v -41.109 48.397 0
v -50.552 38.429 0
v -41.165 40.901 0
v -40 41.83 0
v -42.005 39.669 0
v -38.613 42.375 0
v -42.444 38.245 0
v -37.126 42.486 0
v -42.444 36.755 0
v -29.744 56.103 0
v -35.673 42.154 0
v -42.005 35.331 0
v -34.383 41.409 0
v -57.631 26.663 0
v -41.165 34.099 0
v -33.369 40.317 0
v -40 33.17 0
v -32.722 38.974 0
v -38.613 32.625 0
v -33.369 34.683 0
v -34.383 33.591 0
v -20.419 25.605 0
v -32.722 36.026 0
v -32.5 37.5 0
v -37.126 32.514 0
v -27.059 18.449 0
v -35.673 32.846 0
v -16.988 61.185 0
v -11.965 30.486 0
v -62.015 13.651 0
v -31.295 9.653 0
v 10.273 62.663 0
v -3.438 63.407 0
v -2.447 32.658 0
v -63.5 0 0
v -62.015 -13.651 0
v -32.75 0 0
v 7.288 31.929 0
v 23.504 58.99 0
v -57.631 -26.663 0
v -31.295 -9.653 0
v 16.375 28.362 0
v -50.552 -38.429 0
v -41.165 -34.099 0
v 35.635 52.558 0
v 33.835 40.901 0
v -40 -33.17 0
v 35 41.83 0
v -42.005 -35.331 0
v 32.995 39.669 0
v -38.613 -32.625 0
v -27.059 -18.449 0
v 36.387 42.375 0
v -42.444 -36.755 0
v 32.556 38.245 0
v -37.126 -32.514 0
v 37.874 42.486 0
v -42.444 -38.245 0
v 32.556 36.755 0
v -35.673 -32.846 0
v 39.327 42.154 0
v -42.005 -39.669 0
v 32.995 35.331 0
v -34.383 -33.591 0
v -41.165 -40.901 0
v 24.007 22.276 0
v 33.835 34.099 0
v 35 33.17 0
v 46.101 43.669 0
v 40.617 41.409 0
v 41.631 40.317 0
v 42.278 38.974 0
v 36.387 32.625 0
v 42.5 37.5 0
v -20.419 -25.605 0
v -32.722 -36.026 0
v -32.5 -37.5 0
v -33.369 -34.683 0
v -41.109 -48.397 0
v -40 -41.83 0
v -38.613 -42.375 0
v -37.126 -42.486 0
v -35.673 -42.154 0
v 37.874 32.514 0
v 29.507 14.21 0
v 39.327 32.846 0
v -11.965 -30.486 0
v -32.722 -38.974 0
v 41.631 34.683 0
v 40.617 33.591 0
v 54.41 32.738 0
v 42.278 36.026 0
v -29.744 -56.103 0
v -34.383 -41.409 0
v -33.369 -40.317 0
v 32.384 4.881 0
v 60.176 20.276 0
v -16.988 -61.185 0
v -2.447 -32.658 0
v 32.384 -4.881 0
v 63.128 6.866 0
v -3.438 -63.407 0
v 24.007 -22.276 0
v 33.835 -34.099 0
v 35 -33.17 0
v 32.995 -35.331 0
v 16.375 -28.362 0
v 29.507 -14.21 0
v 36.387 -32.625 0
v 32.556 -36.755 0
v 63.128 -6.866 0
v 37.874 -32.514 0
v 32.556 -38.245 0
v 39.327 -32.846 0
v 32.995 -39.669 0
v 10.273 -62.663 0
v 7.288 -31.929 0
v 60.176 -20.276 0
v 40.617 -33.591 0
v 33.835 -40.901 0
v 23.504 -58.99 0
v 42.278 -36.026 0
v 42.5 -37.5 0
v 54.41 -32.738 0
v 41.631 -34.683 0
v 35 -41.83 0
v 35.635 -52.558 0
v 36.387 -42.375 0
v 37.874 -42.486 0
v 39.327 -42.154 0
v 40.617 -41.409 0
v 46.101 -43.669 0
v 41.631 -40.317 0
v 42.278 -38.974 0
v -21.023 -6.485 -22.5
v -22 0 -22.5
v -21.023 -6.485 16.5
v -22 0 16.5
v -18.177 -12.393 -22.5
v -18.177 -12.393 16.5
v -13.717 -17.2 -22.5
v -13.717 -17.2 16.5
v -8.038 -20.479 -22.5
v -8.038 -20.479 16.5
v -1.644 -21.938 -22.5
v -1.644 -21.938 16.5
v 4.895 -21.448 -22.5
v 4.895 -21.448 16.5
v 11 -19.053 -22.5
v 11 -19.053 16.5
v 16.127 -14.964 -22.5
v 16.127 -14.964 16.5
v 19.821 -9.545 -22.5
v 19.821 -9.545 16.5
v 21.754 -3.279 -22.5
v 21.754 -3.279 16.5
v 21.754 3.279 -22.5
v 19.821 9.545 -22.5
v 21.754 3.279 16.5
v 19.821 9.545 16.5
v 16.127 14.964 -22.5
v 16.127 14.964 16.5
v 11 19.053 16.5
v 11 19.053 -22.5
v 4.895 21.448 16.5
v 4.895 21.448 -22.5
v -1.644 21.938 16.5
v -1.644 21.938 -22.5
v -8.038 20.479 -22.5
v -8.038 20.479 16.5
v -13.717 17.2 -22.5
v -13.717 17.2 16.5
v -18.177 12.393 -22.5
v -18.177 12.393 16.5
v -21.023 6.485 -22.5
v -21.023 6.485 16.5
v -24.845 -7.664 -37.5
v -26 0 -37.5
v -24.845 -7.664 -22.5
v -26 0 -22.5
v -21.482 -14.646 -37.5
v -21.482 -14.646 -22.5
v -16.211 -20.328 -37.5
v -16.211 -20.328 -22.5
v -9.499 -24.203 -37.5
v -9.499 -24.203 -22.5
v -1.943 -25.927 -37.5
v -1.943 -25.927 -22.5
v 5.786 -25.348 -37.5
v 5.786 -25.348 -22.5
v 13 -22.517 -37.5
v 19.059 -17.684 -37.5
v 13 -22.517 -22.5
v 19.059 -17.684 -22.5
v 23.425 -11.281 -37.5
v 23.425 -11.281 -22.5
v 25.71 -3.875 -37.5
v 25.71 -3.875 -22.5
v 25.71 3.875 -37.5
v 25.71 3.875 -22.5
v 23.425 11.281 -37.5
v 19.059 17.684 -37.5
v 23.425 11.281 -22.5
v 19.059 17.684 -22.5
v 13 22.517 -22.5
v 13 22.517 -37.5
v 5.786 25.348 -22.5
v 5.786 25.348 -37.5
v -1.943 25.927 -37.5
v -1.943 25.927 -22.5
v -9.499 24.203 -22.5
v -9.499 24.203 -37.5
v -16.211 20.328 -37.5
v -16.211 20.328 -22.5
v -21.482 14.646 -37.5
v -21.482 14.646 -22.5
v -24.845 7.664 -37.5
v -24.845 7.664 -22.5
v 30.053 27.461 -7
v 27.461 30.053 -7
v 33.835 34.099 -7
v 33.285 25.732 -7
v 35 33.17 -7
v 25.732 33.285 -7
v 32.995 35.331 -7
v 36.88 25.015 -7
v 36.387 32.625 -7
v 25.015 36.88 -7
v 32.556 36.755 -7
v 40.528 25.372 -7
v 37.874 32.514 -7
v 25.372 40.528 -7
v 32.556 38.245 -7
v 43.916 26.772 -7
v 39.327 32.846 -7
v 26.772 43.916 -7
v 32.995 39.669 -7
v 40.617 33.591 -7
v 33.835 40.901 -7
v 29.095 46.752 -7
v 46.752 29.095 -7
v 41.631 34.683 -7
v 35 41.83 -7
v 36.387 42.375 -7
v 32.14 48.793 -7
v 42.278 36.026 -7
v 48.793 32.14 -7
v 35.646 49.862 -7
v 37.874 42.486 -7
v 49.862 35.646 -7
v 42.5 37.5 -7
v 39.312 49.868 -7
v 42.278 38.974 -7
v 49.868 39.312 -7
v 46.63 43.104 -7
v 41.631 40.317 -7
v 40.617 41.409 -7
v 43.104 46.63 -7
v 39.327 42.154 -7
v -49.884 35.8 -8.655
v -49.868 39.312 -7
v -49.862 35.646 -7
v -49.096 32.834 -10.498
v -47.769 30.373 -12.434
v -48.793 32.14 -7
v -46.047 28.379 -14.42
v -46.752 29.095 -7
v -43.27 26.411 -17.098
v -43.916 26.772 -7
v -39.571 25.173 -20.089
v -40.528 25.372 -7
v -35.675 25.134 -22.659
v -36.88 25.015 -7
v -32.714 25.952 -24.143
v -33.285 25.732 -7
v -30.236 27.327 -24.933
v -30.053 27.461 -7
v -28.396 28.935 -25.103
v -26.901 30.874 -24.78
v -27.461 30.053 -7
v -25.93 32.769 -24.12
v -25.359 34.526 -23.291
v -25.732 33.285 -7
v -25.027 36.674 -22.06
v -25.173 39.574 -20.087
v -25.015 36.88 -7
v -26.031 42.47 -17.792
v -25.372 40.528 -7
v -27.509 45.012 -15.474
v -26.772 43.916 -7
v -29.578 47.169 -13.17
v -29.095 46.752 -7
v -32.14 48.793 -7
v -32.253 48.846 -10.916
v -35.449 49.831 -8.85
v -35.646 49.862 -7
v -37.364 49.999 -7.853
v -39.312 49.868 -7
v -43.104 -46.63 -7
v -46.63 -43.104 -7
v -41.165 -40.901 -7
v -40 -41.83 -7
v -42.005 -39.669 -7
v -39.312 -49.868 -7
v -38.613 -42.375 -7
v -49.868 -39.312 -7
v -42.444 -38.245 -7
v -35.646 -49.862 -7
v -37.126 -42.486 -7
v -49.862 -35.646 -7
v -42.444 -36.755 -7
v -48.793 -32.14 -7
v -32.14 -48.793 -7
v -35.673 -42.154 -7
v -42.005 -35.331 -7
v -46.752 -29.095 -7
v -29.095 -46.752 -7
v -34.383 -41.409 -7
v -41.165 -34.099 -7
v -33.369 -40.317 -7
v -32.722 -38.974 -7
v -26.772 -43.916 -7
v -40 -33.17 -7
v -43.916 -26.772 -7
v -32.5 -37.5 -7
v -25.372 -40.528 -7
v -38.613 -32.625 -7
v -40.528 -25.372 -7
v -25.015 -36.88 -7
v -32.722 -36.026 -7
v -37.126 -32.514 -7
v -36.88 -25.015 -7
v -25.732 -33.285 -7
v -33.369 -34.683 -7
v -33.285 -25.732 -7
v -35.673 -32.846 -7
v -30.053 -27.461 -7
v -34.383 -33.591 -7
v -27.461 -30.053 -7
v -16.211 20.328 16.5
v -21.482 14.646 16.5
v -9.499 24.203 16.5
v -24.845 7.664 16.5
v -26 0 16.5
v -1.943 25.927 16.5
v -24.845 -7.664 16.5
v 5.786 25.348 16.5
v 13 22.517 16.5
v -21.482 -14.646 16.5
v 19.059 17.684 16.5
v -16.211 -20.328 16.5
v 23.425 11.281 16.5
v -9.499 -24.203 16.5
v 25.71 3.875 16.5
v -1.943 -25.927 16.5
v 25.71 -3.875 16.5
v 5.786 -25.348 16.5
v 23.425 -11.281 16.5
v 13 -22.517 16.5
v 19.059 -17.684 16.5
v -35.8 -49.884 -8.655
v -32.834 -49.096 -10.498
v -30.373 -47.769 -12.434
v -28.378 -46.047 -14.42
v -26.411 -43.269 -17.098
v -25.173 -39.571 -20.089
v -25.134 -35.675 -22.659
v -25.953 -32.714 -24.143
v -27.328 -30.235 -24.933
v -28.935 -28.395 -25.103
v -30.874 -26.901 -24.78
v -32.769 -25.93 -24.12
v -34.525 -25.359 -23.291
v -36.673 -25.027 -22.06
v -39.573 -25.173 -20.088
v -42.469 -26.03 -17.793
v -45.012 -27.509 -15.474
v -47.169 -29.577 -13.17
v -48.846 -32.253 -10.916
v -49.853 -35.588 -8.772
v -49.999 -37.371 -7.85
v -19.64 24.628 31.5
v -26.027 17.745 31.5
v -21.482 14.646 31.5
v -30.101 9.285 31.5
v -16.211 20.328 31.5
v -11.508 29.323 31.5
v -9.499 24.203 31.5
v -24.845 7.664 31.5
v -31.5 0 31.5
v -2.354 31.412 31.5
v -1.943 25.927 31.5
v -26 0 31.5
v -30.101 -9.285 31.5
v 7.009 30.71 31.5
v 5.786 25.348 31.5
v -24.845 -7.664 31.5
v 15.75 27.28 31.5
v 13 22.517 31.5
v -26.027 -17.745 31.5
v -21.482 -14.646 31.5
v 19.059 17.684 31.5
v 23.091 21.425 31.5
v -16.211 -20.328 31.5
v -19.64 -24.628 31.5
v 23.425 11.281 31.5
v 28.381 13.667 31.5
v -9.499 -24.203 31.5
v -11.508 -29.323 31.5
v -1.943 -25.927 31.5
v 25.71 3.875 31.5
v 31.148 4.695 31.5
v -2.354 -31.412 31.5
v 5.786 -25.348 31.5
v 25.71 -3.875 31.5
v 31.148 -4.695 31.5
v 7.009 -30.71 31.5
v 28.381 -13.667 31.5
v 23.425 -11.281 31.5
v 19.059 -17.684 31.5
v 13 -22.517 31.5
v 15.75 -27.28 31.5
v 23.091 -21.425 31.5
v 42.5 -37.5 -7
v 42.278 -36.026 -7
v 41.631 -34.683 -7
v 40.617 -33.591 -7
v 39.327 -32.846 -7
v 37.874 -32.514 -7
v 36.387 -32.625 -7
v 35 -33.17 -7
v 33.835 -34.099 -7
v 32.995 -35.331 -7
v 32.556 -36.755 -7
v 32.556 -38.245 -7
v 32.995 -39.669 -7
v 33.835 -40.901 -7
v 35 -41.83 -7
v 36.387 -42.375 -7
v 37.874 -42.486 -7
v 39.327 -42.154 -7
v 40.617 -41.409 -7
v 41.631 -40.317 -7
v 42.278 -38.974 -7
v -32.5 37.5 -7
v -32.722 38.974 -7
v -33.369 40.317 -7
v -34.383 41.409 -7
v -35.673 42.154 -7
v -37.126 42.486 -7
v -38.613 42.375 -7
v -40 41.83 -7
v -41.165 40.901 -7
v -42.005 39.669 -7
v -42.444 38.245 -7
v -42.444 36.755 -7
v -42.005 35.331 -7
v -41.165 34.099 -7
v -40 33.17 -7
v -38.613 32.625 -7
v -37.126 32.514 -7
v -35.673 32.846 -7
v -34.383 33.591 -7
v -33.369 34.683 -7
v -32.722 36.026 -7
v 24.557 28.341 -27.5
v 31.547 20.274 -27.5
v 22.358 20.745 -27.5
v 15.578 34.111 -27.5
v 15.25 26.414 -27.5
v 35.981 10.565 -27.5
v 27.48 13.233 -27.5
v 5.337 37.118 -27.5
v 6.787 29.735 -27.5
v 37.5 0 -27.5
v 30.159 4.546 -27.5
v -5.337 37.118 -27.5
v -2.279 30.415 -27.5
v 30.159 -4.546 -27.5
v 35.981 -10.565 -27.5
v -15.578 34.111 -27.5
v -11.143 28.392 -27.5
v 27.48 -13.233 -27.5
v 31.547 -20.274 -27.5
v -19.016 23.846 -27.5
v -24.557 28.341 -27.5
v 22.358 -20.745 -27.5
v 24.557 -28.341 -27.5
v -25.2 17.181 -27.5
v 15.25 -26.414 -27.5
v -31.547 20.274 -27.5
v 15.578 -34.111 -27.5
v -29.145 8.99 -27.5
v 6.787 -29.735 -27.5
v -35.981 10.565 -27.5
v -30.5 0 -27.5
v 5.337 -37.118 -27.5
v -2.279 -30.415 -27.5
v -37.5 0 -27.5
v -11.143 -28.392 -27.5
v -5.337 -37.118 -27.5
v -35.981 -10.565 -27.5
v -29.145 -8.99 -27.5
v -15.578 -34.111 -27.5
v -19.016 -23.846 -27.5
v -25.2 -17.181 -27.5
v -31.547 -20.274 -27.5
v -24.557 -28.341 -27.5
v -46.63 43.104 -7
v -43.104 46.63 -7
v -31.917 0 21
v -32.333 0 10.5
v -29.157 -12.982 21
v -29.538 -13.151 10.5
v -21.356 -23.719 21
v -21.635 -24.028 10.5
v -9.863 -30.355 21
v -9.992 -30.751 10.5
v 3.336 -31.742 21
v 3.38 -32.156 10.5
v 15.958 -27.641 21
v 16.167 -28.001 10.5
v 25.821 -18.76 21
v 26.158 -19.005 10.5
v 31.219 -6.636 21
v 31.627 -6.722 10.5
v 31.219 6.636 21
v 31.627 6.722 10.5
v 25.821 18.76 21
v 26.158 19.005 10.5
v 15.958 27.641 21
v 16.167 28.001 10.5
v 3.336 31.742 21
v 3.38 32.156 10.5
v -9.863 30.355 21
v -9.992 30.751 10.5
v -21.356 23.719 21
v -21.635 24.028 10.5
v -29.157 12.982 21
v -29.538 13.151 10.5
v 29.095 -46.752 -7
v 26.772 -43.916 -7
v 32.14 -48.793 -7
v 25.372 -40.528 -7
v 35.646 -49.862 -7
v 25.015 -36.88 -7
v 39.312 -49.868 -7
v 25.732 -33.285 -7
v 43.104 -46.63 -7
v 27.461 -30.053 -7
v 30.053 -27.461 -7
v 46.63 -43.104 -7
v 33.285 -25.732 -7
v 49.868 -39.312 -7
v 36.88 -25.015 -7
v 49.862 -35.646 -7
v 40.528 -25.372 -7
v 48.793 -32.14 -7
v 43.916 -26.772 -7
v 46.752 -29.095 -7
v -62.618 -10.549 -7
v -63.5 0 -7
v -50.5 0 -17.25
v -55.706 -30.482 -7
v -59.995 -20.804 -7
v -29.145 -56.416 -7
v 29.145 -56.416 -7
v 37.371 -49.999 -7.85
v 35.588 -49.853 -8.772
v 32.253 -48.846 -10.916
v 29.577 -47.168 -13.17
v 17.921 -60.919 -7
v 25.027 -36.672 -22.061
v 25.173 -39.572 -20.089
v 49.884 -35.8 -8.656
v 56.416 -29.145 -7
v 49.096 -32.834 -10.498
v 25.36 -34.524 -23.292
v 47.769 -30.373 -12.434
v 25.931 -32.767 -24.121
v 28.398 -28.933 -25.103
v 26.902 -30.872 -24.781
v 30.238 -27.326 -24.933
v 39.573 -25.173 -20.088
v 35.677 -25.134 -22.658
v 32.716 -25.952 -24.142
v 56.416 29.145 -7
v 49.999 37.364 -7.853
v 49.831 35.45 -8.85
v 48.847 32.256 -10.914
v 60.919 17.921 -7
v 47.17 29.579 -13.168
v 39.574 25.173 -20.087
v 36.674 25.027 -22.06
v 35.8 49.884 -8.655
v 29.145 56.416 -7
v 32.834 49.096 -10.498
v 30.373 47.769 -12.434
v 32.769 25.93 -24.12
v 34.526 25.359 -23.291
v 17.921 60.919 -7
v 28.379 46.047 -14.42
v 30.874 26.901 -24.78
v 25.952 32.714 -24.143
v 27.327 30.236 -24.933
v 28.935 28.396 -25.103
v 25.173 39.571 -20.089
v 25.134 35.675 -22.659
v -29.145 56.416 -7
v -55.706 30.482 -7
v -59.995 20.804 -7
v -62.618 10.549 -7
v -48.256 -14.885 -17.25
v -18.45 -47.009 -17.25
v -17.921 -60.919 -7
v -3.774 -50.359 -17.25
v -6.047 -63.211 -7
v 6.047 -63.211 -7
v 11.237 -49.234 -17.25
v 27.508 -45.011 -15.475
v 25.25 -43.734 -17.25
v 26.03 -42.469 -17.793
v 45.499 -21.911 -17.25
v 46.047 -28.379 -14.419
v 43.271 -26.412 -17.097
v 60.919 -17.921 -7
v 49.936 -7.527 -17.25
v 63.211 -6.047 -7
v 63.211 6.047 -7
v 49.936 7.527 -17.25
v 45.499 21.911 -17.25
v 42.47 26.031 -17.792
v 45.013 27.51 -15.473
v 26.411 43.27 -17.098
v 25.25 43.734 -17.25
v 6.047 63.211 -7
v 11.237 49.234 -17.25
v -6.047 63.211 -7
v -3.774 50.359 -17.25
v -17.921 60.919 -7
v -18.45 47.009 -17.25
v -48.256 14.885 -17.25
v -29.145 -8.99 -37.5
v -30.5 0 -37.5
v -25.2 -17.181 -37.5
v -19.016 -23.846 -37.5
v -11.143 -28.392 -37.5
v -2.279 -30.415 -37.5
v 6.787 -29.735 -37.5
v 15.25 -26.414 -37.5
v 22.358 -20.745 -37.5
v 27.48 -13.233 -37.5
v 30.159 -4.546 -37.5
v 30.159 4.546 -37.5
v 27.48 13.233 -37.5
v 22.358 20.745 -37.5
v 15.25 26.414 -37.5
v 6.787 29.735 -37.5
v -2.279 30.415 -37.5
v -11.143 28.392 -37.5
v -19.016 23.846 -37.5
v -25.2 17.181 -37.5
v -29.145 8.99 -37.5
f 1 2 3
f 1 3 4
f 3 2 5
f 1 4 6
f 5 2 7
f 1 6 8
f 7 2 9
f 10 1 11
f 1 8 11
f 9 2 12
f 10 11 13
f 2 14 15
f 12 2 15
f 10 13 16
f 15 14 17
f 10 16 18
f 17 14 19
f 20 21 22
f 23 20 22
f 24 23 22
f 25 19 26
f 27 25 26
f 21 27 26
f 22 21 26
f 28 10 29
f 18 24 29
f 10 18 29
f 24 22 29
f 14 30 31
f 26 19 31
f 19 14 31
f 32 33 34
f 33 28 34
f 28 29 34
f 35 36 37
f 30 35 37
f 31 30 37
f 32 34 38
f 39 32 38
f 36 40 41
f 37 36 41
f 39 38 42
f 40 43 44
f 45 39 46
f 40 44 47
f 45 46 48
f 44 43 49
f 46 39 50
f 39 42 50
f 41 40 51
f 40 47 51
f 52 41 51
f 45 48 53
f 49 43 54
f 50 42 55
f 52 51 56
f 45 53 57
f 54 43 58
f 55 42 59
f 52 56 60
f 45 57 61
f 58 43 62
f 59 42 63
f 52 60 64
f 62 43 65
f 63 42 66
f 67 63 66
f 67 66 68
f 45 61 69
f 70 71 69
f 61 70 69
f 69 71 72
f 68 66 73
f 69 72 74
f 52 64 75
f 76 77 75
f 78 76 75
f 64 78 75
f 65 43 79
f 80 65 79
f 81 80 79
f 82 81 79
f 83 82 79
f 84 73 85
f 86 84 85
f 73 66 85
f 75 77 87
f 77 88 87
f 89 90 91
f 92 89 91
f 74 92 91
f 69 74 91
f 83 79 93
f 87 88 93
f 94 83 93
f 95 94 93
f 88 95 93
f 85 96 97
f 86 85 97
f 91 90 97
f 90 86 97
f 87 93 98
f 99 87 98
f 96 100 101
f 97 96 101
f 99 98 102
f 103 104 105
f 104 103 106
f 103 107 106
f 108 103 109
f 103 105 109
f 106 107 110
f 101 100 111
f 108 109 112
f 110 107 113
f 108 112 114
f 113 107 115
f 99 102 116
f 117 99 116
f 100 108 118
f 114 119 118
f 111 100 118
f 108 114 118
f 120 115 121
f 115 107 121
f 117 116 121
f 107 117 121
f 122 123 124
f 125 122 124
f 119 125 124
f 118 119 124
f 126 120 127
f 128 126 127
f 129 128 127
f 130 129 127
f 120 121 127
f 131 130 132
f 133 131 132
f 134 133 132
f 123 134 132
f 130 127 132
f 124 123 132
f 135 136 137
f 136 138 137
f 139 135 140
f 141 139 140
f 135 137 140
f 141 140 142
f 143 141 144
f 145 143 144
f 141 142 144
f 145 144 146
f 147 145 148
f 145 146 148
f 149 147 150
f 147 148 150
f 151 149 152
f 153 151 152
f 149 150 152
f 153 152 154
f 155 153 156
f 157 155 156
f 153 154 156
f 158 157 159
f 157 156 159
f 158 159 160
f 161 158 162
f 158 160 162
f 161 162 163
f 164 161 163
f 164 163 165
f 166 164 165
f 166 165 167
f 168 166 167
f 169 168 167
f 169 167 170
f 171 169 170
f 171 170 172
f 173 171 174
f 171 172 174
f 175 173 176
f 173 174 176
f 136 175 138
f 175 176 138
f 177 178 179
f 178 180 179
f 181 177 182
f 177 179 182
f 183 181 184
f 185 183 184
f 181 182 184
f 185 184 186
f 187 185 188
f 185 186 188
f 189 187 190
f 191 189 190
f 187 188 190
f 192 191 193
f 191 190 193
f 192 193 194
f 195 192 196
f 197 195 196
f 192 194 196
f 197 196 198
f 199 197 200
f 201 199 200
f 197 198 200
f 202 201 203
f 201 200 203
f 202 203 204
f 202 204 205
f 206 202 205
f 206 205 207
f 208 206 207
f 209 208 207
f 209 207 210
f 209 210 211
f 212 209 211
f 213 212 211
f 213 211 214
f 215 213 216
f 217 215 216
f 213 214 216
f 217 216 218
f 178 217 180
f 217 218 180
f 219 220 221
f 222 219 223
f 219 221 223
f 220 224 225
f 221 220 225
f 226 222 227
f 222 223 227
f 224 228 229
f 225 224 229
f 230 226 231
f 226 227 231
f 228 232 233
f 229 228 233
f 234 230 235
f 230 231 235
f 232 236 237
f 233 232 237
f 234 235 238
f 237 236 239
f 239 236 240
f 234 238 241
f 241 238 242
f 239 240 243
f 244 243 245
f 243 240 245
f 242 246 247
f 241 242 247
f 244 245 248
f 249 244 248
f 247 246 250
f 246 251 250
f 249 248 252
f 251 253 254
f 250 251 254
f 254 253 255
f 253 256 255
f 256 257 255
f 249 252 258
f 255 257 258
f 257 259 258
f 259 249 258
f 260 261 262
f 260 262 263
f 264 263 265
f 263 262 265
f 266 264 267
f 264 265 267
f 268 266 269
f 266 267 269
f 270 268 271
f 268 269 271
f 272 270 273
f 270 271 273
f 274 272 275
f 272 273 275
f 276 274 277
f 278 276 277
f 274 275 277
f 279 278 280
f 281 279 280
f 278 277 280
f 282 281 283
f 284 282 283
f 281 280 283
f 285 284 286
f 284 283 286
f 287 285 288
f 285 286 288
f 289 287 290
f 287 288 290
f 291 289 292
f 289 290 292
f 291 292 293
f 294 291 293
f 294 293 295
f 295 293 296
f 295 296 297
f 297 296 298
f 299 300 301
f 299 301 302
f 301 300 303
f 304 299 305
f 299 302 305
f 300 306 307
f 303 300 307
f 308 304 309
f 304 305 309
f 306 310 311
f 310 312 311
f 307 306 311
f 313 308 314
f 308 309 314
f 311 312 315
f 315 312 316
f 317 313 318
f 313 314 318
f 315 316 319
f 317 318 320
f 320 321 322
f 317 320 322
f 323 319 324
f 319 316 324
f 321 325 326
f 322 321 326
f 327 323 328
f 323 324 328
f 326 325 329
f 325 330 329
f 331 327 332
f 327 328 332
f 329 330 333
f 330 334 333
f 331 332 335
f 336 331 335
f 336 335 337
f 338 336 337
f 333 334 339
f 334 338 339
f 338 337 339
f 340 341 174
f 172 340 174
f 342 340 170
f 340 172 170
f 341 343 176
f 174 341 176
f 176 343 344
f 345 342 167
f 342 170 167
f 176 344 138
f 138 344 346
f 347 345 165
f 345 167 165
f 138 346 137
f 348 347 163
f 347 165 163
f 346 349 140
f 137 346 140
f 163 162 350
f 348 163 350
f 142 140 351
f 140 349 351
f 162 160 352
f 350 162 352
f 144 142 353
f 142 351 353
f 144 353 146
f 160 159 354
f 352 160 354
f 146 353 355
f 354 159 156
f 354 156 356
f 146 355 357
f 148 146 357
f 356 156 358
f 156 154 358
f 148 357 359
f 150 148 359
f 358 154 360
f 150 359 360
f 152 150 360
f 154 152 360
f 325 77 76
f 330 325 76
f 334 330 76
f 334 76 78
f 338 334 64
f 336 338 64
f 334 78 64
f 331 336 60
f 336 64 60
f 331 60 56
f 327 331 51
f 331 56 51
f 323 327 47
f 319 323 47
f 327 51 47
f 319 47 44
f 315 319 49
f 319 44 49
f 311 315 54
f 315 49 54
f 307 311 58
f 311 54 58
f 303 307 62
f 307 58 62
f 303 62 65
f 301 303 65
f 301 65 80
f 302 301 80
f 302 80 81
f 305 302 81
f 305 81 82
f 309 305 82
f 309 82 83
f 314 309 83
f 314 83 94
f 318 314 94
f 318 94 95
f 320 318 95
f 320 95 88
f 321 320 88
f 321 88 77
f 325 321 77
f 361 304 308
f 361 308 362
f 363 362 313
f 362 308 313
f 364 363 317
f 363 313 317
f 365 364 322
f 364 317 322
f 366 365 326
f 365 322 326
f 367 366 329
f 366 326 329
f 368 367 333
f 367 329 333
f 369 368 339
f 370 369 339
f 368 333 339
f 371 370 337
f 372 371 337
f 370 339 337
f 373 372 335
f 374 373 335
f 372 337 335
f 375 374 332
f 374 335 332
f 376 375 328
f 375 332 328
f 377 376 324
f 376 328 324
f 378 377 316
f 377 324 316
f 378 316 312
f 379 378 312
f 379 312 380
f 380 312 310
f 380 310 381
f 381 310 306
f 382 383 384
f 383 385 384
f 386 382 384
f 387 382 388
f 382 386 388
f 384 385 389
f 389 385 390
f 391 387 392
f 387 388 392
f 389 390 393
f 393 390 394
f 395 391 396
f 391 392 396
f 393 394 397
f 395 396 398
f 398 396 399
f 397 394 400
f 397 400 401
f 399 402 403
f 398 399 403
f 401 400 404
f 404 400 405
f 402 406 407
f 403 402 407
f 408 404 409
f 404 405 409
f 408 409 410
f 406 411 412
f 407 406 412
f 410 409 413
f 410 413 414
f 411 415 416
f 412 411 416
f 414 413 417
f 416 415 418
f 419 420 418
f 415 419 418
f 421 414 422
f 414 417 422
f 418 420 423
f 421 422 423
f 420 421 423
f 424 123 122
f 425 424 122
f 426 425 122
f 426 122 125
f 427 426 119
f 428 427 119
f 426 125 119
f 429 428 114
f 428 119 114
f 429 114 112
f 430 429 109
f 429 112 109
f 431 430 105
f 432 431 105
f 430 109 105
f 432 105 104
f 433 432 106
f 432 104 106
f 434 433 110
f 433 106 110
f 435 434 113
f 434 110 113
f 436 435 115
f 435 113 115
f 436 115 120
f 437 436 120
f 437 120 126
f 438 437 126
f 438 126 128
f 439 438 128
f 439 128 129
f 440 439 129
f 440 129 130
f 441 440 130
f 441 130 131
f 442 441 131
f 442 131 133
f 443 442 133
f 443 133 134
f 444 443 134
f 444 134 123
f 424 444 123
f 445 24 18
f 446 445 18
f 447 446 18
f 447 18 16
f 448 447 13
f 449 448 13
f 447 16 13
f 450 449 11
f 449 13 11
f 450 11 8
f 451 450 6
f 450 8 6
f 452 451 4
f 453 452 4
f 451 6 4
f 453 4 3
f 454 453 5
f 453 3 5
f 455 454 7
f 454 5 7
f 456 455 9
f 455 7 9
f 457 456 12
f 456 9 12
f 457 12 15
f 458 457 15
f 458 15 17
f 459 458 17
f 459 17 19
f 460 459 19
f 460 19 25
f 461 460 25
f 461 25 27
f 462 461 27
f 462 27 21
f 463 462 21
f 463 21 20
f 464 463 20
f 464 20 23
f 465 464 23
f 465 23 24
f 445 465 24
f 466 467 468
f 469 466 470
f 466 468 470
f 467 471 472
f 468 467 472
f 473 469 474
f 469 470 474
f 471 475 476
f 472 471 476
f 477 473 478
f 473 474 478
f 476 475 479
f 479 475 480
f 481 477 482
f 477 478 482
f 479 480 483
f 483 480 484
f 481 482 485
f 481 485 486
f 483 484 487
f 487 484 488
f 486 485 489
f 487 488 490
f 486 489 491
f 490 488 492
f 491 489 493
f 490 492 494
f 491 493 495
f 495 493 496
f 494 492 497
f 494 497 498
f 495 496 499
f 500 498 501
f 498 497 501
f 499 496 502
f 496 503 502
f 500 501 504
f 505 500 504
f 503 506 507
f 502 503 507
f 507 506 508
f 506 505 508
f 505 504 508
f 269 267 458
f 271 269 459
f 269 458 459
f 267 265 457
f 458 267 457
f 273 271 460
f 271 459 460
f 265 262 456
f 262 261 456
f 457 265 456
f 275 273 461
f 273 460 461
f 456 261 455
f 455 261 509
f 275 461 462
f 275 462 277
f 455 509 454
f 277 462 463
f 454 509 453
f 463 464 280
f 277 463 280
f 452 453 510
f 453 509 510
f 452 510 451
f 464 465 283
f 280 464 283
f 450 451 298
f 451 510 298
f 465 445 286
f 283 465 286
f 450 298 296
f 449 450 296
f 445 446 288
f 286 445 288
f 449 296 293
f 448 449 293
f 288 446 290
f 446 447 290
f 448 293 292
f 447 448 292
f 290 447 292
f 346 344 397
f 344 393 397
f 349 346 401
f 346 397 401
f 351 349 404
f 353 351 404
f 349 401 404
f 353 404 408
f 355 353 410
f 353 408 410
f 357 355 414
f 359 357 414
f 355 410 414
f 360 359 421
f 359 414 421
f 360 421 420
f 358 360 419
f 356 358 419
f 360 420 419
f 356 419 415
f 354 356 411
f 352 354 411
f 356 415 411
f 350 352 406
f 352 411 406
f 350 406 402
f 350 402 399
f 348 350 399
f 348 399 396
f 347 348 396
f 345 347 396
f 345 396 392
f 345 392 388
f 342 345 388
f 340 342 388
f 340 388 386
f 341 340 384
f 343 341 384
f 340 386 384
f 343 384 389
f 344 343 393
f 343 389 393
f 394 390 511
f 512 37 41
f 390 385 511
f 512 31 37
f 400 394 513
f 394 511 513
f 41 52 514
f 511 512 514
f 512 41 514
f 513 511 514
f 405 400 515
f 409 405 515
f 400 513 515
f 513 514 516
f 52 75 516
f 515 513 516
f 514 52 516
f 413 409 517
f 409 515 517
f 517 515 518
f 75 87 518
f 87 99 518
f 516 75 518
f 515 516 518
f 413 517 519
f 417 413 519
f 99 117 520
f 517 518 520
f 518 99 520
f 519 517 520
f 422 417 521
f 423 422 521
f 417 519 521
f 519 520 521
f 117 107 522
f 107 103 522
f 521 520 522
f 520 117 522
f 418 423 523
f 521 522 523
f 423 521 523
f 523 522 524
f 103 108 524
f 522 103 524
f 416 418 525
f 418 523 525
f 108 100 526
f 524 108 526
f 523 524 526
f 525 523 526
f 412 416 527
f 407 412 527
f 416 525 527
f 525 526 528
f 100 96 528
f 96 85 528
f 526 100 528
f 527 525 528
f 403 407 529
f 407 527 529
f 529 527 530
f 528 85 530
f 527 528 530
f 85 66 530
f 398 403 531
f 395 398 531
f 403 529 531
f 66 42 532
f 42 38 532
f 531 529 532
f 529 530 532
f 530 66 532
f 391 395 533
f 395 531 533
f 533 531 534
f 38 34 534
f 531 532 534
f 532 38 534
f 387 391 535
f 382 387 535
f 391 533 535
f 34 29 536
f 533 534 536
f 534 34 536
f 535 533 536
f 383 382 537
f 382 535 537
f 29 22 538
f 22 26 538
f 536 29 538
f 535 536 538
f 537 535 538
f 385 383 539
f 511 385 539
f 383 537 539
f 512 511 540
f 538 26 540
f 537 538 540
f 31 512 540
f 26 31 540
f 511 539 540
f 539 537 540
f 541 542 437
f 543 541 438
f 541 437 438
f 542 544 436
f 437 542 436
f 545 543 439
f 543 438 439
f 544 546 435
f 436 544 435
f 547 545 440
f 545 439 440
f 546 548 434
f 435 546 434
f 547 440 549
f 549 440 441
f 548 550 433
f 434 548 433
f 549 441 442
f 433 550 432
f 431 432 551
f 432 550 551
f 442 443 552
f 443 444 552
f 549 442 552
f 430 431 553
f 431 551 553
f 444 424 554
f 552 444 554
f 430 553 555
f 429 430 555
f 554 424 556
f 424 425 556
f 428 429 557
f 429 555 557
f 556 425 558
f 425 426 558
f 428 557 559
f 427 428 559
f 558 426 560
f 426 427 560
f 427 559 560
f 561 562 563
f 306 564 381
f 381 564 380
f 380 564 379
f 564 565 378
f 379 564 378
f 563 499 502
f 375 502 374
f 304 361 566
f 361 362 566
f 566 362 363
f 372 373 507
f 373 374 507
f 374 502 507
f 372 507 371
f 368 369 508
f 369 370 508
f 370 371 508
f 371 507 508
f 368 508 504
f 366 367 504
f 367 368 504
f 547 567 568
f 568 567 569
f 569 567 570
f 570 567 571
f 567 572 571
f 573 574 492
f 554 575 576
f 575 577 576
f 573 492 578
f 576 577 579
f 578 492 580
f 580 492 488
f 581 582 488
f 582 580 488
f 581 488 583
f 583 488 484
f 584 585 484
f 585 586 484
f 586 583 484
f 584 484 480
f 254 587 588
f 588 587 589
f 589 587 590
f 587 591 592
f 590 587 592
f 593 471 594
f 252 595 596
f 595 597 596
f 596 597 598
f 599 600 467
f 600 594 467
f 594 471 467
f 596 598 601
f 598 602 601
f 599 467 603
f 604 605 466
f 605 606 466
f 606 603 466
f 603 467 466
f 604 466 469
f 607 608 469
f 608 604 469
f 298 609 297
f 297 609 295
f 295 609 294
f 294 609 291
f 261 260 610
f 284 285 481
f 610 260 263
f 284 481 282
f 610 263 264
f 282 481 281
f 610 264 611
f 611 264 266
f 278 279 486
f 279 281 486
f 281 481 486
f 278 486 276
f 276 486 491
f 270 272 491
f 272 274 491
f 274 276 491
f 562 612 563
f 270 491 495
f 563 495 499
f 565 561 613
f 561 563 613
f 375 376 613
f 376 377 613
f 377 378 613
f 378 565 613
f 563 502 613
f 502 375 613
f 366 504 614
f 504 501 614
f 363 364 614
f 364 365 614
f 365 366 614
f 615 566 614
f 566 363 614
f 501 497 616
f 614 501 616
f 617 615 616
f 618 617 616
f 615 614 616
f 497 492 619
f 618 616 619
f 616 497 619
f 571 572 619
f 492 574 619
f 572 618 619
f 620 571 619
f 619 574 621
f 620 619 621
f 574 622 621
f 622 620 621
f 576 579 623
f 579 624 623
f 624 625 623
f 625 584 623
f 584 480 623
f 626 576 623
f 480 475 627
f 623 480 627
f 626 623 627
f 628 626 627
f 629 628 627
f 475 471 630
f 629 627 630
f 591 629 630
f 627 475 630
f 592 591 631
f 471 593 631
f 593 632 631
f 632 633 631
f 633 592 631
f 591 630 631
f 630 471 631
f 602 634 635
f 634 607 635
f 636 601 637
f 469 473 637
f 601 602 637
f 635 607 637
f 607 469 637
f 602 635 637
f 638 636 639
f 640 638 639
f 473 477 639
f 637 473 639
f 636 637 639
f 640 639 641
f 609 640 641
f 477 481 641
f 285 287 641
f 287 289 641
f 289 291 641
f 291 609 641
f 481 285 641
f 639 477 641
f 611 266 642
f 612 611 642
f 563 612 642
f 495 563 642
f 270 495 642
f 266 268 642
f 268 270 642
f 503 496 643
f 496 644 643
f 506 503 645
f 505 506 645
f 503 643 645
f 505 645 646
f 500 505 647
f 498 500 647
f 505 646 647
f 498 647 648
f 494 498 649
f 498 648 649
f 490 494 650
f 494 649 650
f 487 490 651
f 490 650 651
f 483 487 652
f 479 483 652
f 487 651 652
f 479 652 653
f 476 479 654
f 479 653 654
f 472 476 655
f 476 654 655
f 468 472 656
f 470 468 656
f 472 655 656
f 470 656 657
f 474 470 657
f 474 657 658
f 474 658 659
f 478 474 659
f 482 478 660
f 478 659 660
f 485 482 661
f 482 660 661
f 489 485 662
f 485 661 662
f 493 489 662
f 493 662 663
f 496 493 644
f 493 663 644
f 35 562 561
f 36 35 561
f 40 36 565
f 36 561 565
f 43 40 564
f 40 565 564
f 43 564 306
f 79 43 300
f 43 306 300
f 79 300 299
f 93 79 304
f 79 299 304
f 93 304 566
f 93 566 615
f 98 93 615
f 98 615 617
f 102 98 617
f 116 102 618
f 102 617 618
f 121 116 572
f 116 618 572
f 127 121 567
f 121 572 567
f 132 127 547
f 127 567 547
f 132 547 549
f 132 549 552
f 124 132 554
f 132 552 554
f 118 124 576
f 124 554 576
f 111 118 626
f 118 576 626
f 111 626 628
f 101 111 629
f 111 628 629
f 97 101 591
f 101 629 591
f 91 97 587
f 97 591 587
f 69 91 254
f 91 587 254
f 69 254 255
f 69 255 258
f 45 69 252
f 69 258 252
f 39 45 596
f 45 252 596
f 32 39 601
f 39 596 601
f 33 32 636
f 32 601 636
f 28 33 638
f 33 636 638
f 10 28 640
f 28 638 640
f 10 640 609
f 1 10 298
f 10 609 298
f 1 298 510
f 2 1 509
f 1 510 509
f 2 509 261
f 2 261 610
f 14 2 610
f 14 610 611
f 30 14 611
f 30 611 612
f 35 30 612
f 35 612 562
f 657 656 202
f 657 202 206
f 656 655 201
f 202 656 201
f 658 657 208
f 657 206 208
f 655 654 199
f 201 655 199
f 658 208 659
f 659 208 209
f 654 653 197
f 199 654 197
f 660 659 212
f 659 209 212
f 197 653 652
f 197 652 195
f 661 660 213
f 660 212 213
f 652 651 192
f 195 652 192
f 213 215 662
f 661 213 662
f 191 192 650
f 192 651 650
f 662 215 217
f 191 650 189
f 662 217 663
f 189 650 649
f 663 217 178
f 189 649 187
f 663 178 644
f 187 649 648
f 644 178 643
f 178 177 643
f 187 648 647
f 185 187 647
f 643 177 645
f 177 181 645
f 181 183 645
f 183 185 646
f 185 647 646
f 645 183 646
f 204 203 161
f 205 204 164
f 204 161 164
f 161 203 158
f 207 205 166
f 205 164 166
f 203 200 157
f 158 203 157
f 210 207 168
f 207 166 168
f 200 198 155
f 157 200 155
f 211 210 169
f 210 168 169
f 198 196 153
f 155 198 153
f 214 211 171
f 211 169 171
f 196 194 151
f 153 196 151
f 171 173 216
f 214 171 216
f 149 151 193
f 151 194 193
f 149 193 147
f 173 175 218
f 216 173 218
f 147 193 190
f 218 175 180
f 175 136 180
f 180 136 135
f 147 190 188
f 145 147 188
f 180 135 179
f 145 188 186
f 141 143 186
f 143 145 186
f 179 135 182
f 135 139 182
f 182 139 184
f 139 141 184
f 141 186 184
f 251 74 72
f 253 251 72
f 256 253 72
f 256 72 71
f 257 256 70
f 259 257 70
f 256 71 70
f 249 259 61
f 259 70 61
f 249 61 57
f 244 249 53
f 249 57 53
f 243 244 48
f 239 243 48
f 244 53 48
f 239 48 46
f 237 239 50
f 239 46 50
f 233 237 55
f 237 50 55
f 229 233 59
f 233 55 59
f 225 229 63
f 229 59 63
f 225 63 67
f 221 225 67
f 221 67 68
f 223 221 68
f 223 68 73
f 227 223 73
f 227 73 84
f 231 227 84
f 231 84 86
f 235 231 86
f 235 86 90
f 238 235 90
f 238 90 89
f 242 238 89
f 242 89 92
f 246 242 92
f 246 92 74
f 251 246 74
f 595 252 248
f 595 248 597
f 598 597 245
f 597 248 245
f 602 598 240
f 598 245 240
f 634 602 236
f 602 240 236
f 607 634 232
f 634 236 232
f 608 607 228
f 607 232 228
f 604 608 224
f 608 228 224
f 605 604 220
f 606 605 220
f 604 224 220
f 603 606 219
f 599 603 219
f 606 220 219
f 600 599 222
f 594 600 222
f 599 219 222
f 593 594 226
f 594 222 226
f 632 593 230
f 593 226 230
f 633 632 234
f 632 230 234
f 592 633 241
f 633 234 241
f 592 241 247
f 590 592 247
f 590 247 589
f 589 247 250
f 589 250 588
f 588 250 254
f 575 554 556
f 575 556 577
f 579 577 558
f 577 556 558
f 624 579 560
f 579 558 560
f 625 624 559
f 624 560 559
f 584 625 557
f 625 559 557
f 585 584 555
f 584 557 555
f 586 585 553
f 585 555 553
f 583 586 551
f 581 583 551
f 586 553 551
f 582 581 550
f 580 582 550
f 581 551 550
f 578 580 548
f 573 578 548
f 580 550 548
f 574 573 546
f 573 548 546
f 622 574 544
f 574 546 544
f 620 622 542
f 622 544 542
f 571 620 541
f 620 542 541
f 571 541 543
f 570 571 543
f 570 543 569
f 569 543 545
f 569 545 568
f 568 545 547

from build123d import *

# Parameters (mm, degrees)
F0_R     = 5
F3_DEPTH = 25
F5_R     = 12.5
F6_DEPTH = 25


with BuildPart() as f2:
    # F1 (on Front) → F2 (revolve)
    with BuildSketch(Plane.XZ):
        Polygon((-31.5, 31.5), (-32.75, 0), (-63.5, 0), (-63.5, -7), (-37.5, -27.5), (-30.5, -27.5), (-30.5, -37.5), (-26, -37.5), (-26, -22.5), (-22, -22.5), (-22, 16.5), (-26, 16.5), (-26, 31.5), align=None)
    revolve(axis=Axis((0, 0, 30.379497), (0, 0, 1)))

    # F0 (on Top) → F3 (cut)
    with BuildSketch(Plane.XY):
        with Locations((-37.5, 37.5)):
            Circle(F0_R)
        with Locations((-37.5, -37.5)):
            Circle(F0_R)
        with Locations((37.5, -37.5)):
            Circle(F0_R)
        with Locations((37.5, 37.5)):
            Circle(F0_R)
    extrude(amount=-F3_DEPTH, mode=Mode.SUBTRACT)

    # F5 (on offset) → F6 (cut)
    with BuildSketch(Plane.XY.offset(-7)):
        with Locations((-37.5, 37.5)):
            Circle(F5_R)
        with Locations((37.5, 37.5)):
            Circle(F5_R)
        with Locations((-37.5, -37.5)):
            Circle(F5_R)
        with Locations((37.5, -37.5)):
            Circle(F5_R)
    extrude(amount=-F6_DEPTH, mode=Mode.SUBTRACT)


solid = f2.part
